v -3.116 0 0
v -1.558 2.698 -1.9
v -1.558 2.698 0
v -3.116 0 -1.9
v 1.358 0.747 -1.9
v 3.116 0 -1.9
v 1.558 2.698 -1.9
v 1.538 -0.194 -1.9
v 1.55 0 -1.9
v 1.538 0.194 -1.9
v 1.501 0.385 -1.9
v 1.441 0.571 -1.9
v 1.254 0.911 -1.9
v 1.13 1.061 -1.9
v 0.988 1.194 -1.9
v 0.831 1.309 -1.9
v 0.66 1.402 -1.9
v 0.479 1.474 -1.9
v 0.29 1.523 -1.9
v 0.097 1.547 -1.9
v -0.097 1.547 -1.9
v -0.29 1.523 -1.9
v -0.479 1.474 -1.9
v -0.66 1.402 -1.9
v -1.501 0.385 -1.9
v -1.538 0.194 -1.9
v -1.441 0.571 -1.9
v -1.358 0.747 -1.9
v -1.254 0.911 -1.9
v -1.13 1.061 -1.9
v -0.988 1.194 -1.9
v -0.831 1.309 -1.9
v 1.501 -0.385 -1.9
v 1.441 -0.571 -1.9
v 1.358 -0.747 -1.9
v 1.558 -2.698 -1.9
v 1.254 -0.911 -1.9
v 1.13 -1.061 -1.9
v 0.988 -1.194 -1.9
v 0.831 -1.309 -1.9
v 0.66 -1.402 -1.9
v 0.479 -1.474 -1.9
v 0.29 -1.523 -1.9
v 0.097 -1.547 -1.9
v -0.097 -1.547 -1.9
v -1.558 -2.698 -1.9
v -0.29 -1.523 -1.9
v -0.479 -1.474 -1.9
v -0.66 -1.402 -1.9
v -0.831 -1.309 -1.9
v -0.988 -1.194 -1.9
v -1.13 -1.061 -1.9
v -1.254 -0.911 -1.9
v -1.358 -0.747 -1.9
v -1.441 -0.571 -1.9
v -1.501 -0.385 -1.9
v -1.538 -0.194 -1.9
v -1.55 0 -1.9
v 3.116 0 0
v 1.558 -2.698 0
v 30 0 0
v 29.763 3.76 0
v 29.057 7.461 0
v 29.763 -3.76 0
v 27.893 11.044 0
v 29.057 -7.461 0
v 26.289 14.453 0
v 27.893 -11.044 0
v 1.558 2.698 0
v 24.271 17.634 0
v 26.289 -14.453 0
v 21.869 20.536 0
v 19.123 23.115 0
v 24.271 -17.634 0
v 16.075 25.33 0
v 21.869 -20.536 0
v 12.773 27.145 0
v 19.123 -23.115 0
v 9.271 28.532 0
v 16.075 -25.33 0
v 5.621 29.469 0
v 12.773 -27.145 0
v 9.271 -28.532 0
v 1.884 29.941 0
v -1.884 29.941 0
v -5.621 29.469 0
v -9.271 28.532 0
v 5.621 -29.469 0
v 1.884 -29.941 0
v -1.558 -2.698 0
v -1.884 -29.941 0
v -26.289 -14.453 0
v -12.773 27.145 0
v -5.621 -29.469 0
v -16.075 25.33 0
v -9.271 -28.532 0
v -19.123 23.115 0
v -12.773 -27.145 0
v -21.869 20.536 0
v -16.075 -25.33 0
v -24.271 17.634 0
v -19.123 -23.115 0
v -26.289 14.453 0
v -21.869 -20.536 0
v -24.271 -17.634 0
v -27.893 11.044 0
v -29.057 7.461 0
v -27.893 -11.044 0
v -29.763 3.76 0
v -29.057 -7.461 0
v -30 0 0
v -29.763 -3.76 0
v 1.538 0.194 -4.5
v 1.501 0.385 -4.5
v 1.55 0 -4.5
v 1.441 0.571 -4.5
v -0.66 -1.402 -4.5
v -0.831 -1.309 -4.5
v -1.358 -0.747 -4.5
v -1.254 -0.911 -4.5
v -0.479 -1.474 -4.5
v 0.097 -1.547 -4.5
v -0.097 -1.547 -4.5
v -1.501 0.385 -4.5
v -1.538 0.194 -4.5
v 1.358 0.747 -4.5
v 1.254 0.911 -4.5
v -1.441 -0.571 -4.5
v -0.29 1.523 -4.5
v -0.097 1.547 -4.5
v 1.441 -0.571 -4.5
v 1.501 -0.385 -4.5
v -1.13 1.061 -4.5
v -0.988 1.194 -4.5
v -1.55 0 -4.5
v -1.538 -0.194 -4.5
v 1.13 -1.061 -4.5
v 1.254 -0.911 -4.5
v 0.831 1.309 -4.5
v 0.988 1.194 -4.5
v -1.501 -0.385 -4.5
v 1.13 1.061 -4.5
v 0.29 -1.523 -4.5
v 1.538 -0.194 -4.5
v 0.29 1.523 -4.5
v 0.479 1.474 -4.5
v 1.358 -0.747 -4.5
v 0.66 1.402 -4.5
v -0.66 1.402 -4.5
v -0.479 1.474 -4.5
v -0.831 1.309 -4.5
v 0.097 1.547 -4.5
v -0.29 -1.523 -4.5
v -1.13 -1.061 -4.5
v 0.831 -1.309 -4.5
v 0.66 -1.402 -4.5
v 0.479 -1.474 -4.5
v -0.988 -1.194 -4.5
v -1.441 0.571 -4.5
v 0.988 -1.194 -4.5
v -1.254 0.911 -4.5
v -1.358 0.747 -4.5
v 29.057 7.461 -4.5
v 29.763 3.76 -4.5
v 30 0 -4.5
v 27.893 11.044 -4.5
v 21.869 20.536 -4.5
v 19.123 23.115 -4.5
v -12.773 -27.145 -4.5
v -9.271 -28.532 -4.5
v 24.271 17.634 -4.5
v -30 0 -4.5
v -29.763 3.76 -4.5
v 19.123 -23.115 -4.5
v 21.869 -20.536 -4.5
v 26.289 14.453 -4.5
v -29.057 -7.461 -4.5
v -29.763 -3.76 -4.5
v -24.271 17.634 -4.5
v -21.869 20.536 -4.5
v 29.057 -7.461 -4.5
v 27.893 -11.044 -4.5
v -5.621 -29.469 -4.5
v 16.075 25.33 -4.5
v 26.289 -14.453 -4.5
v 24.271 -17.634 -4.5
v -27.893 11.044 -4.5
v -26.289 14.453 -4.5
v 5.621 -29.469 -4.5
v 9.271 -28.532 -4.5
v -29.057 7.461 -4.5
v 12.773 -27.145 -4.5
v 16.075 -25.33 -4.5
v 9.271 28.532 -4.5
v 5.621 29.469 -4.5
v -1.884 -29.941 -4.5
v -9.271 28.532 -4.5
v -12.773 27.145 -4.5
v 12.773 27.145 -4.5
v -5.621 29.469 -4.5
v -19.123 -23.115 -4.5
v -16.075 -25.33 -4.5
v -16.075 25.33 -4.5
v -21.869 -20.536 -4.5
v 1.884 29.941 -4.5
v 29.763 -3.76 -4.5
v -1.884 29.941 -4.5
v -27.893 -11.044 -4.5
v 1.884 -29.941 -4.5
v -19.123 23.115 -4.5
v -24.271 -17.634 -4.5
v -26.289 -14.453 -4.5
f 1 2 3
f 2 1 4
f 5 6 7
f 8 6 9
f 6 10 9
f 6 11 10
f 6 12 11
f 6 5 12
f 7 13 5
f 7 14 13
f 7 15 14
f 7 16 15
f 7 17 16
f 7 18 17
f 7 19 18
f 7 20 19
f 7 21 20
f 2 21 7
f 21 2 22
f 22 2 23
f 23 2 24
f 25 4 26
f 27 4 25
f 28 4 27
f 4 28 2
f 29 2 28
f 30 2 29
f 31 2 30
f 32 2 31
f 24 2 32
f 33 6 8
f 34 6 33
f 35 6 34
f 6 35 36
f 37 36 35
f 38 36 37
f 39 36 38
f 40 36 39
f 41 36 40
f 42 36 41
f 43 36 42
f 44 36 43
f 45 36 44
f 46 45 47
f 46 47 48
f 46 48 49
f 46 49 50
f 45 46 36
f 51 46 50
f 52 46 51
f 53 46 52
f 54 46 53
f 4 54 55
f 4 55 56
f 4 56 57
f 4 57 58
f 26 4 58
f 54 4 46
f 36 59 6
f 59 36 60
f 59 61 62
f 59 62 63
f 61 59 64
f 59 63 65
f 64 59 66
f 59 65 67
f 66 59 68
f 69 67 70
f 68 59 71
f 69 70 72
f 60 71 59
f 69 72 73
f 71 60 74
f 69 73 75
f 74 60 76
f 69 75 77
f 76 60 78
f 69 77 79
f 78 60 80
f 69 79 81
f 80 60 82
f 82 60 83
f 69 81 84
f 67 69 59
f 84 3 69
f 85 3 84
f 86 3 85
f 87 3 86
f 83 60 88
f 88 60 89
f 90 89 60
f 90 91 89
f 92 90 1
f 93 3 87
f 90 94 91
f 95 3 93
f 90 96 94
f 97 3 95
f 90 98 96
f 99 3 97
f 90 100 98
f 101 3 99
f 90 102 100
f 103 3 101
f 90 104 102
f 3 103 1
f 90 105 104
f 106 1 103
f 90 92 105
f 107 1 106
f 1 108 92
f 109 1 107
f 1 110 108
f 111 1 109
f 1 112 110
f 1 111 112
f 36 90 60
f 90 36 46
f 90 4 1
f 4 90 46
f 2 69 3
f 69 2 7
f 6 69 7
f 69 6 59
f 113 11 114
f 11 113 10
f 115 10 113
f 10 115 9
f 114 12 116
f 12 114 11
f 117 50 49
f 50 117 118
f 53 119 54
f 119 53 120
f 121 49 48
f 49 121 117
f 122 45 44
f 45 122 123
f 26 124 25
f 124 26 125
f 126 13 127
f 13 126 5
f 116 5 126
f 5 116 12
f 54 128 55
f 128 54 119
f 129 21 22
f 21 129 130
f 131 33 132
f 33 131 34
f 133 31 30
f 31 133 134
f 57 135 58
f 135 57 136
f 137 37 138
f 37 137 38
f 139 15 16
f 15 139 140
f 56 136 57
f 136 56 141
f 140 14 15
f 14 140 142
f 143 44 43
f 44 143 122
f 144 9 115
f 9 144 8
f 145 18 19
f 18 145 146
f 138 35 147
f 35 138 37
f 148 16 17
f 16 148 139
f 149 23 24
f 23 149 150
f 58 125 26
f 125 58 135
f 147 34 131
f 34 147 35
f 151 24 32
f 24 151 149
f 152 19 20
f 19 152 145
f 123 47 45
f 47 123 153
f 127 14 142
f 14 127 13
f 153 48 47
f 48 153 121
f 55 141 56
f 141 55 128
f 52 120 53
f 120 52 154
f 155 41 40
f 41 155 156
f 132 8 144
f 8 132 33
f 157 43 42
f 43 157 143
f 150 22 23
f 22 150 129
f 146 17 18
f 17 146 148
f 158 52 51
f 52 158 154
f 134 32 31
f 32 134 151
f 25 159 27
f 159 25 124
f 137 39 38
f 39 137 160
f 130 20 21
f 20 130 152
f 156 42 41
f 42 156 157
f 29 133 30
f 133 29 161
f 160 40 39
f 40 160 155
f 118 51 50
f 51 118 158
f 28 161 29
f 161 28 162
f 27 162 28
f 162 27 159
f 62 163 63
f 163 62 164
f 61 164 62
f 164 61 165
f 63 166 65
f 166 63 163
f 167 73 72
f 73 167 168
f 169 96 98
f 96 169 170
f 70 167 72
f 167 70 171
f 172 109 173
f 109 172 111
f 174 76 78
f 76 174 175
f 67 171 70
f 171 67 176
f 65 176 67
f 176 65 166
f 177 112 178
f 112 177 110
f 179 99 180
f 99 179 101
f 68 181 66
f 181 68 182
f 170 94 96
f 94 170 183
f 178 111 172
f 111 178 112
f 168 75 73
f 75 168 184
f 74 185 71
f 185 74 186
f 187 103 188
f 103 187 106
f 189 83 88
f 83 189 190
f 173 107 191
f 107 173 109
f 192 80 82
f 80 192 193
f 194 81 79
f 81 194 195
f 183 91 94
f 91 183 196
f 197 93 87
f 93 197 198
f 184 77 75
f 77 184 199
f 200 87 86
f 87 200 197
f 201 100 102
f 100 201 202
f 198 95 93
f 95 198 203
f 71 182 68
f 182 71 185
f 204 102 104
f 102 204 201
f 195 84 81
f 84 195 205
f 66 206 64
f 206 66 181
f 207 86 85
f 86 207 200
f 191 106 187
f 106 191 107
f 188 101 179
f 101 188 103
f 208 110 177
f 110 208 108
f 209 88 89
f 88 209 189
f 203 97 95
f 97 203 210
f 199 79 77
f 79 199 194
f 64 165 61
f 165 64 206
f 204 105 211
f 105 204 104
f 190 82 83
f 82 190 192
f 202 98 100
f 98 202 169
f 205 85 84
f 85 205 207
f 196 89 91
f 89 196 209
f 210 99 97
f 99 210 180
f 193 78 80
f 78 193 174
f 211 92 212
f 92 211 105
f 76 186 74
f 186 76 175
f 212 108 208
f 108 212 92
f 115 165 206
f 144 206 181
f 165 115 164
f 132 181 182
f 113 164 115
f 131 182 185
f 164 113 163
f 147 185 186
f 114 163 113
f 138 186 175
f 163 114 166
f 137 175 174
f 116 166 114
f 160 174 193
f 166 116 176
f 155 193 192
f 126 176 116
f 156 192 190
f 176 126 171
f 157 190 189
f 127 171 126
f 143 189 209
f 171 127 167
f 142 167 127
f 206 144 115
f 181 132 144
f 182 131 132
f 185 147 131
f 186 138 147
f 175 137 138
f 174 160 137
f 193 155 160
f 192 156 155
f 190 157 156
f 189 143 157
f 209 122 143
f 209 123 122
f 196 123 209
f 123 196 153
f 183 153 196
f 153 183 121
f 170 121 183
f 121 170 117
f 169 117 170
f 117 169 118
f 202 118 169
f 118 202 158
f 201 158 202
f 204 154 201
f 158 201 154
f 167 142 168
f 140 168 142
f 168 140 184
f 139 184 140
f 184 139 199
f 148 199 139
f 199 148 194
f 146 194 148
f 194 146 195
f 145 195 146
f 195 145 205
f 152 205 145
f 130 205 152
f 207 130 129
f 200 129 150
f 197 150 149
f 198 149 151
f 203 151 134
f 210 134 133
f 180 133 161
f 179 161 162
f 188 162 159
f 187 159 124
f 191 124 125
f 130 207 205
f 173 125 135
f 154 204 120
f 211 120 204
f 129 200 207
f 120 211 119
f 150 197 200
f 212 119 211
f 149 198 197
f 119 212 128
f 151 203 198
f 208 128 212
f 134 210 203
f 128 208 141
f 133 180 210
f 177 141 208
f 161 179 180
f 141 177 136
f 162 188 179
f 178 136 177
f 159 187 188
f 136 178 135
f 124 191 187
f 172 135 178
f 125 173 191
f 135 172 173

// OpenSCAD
$fn = 50;


difference() {
	union() {
		translate(v = [0, 0, -4.5000000000]) {
			cylinder(h = 4.5000000000, r = 30.0000000000);
		}
	}
	union() {
		translate(v = [0, 0, 0]) {
			rotate(a = [0, 0, 0]) {
				difference() {
					union() {
						translate(v = [0, 0, -1.9000000000]) {
							linear_extrude(height = 1.9000000000) {
								polygon(points = [[3.1158000000, 0.0000000000], [1.5579000000, 2.6983619531], [-1.5579000000, 2.6983619531], [-3.1158000000, 0.0000000000], [-1.5579000000, -2.6983619531], [1.5579000000, -2.6983619531]]);
							}
						}
					}
					union();
				}
			}
		}
		#translate(v = [0, 0, -100.0000000000]) {
			cylinder(h = 200, r = 1.5500000000);
		}
	}
}
